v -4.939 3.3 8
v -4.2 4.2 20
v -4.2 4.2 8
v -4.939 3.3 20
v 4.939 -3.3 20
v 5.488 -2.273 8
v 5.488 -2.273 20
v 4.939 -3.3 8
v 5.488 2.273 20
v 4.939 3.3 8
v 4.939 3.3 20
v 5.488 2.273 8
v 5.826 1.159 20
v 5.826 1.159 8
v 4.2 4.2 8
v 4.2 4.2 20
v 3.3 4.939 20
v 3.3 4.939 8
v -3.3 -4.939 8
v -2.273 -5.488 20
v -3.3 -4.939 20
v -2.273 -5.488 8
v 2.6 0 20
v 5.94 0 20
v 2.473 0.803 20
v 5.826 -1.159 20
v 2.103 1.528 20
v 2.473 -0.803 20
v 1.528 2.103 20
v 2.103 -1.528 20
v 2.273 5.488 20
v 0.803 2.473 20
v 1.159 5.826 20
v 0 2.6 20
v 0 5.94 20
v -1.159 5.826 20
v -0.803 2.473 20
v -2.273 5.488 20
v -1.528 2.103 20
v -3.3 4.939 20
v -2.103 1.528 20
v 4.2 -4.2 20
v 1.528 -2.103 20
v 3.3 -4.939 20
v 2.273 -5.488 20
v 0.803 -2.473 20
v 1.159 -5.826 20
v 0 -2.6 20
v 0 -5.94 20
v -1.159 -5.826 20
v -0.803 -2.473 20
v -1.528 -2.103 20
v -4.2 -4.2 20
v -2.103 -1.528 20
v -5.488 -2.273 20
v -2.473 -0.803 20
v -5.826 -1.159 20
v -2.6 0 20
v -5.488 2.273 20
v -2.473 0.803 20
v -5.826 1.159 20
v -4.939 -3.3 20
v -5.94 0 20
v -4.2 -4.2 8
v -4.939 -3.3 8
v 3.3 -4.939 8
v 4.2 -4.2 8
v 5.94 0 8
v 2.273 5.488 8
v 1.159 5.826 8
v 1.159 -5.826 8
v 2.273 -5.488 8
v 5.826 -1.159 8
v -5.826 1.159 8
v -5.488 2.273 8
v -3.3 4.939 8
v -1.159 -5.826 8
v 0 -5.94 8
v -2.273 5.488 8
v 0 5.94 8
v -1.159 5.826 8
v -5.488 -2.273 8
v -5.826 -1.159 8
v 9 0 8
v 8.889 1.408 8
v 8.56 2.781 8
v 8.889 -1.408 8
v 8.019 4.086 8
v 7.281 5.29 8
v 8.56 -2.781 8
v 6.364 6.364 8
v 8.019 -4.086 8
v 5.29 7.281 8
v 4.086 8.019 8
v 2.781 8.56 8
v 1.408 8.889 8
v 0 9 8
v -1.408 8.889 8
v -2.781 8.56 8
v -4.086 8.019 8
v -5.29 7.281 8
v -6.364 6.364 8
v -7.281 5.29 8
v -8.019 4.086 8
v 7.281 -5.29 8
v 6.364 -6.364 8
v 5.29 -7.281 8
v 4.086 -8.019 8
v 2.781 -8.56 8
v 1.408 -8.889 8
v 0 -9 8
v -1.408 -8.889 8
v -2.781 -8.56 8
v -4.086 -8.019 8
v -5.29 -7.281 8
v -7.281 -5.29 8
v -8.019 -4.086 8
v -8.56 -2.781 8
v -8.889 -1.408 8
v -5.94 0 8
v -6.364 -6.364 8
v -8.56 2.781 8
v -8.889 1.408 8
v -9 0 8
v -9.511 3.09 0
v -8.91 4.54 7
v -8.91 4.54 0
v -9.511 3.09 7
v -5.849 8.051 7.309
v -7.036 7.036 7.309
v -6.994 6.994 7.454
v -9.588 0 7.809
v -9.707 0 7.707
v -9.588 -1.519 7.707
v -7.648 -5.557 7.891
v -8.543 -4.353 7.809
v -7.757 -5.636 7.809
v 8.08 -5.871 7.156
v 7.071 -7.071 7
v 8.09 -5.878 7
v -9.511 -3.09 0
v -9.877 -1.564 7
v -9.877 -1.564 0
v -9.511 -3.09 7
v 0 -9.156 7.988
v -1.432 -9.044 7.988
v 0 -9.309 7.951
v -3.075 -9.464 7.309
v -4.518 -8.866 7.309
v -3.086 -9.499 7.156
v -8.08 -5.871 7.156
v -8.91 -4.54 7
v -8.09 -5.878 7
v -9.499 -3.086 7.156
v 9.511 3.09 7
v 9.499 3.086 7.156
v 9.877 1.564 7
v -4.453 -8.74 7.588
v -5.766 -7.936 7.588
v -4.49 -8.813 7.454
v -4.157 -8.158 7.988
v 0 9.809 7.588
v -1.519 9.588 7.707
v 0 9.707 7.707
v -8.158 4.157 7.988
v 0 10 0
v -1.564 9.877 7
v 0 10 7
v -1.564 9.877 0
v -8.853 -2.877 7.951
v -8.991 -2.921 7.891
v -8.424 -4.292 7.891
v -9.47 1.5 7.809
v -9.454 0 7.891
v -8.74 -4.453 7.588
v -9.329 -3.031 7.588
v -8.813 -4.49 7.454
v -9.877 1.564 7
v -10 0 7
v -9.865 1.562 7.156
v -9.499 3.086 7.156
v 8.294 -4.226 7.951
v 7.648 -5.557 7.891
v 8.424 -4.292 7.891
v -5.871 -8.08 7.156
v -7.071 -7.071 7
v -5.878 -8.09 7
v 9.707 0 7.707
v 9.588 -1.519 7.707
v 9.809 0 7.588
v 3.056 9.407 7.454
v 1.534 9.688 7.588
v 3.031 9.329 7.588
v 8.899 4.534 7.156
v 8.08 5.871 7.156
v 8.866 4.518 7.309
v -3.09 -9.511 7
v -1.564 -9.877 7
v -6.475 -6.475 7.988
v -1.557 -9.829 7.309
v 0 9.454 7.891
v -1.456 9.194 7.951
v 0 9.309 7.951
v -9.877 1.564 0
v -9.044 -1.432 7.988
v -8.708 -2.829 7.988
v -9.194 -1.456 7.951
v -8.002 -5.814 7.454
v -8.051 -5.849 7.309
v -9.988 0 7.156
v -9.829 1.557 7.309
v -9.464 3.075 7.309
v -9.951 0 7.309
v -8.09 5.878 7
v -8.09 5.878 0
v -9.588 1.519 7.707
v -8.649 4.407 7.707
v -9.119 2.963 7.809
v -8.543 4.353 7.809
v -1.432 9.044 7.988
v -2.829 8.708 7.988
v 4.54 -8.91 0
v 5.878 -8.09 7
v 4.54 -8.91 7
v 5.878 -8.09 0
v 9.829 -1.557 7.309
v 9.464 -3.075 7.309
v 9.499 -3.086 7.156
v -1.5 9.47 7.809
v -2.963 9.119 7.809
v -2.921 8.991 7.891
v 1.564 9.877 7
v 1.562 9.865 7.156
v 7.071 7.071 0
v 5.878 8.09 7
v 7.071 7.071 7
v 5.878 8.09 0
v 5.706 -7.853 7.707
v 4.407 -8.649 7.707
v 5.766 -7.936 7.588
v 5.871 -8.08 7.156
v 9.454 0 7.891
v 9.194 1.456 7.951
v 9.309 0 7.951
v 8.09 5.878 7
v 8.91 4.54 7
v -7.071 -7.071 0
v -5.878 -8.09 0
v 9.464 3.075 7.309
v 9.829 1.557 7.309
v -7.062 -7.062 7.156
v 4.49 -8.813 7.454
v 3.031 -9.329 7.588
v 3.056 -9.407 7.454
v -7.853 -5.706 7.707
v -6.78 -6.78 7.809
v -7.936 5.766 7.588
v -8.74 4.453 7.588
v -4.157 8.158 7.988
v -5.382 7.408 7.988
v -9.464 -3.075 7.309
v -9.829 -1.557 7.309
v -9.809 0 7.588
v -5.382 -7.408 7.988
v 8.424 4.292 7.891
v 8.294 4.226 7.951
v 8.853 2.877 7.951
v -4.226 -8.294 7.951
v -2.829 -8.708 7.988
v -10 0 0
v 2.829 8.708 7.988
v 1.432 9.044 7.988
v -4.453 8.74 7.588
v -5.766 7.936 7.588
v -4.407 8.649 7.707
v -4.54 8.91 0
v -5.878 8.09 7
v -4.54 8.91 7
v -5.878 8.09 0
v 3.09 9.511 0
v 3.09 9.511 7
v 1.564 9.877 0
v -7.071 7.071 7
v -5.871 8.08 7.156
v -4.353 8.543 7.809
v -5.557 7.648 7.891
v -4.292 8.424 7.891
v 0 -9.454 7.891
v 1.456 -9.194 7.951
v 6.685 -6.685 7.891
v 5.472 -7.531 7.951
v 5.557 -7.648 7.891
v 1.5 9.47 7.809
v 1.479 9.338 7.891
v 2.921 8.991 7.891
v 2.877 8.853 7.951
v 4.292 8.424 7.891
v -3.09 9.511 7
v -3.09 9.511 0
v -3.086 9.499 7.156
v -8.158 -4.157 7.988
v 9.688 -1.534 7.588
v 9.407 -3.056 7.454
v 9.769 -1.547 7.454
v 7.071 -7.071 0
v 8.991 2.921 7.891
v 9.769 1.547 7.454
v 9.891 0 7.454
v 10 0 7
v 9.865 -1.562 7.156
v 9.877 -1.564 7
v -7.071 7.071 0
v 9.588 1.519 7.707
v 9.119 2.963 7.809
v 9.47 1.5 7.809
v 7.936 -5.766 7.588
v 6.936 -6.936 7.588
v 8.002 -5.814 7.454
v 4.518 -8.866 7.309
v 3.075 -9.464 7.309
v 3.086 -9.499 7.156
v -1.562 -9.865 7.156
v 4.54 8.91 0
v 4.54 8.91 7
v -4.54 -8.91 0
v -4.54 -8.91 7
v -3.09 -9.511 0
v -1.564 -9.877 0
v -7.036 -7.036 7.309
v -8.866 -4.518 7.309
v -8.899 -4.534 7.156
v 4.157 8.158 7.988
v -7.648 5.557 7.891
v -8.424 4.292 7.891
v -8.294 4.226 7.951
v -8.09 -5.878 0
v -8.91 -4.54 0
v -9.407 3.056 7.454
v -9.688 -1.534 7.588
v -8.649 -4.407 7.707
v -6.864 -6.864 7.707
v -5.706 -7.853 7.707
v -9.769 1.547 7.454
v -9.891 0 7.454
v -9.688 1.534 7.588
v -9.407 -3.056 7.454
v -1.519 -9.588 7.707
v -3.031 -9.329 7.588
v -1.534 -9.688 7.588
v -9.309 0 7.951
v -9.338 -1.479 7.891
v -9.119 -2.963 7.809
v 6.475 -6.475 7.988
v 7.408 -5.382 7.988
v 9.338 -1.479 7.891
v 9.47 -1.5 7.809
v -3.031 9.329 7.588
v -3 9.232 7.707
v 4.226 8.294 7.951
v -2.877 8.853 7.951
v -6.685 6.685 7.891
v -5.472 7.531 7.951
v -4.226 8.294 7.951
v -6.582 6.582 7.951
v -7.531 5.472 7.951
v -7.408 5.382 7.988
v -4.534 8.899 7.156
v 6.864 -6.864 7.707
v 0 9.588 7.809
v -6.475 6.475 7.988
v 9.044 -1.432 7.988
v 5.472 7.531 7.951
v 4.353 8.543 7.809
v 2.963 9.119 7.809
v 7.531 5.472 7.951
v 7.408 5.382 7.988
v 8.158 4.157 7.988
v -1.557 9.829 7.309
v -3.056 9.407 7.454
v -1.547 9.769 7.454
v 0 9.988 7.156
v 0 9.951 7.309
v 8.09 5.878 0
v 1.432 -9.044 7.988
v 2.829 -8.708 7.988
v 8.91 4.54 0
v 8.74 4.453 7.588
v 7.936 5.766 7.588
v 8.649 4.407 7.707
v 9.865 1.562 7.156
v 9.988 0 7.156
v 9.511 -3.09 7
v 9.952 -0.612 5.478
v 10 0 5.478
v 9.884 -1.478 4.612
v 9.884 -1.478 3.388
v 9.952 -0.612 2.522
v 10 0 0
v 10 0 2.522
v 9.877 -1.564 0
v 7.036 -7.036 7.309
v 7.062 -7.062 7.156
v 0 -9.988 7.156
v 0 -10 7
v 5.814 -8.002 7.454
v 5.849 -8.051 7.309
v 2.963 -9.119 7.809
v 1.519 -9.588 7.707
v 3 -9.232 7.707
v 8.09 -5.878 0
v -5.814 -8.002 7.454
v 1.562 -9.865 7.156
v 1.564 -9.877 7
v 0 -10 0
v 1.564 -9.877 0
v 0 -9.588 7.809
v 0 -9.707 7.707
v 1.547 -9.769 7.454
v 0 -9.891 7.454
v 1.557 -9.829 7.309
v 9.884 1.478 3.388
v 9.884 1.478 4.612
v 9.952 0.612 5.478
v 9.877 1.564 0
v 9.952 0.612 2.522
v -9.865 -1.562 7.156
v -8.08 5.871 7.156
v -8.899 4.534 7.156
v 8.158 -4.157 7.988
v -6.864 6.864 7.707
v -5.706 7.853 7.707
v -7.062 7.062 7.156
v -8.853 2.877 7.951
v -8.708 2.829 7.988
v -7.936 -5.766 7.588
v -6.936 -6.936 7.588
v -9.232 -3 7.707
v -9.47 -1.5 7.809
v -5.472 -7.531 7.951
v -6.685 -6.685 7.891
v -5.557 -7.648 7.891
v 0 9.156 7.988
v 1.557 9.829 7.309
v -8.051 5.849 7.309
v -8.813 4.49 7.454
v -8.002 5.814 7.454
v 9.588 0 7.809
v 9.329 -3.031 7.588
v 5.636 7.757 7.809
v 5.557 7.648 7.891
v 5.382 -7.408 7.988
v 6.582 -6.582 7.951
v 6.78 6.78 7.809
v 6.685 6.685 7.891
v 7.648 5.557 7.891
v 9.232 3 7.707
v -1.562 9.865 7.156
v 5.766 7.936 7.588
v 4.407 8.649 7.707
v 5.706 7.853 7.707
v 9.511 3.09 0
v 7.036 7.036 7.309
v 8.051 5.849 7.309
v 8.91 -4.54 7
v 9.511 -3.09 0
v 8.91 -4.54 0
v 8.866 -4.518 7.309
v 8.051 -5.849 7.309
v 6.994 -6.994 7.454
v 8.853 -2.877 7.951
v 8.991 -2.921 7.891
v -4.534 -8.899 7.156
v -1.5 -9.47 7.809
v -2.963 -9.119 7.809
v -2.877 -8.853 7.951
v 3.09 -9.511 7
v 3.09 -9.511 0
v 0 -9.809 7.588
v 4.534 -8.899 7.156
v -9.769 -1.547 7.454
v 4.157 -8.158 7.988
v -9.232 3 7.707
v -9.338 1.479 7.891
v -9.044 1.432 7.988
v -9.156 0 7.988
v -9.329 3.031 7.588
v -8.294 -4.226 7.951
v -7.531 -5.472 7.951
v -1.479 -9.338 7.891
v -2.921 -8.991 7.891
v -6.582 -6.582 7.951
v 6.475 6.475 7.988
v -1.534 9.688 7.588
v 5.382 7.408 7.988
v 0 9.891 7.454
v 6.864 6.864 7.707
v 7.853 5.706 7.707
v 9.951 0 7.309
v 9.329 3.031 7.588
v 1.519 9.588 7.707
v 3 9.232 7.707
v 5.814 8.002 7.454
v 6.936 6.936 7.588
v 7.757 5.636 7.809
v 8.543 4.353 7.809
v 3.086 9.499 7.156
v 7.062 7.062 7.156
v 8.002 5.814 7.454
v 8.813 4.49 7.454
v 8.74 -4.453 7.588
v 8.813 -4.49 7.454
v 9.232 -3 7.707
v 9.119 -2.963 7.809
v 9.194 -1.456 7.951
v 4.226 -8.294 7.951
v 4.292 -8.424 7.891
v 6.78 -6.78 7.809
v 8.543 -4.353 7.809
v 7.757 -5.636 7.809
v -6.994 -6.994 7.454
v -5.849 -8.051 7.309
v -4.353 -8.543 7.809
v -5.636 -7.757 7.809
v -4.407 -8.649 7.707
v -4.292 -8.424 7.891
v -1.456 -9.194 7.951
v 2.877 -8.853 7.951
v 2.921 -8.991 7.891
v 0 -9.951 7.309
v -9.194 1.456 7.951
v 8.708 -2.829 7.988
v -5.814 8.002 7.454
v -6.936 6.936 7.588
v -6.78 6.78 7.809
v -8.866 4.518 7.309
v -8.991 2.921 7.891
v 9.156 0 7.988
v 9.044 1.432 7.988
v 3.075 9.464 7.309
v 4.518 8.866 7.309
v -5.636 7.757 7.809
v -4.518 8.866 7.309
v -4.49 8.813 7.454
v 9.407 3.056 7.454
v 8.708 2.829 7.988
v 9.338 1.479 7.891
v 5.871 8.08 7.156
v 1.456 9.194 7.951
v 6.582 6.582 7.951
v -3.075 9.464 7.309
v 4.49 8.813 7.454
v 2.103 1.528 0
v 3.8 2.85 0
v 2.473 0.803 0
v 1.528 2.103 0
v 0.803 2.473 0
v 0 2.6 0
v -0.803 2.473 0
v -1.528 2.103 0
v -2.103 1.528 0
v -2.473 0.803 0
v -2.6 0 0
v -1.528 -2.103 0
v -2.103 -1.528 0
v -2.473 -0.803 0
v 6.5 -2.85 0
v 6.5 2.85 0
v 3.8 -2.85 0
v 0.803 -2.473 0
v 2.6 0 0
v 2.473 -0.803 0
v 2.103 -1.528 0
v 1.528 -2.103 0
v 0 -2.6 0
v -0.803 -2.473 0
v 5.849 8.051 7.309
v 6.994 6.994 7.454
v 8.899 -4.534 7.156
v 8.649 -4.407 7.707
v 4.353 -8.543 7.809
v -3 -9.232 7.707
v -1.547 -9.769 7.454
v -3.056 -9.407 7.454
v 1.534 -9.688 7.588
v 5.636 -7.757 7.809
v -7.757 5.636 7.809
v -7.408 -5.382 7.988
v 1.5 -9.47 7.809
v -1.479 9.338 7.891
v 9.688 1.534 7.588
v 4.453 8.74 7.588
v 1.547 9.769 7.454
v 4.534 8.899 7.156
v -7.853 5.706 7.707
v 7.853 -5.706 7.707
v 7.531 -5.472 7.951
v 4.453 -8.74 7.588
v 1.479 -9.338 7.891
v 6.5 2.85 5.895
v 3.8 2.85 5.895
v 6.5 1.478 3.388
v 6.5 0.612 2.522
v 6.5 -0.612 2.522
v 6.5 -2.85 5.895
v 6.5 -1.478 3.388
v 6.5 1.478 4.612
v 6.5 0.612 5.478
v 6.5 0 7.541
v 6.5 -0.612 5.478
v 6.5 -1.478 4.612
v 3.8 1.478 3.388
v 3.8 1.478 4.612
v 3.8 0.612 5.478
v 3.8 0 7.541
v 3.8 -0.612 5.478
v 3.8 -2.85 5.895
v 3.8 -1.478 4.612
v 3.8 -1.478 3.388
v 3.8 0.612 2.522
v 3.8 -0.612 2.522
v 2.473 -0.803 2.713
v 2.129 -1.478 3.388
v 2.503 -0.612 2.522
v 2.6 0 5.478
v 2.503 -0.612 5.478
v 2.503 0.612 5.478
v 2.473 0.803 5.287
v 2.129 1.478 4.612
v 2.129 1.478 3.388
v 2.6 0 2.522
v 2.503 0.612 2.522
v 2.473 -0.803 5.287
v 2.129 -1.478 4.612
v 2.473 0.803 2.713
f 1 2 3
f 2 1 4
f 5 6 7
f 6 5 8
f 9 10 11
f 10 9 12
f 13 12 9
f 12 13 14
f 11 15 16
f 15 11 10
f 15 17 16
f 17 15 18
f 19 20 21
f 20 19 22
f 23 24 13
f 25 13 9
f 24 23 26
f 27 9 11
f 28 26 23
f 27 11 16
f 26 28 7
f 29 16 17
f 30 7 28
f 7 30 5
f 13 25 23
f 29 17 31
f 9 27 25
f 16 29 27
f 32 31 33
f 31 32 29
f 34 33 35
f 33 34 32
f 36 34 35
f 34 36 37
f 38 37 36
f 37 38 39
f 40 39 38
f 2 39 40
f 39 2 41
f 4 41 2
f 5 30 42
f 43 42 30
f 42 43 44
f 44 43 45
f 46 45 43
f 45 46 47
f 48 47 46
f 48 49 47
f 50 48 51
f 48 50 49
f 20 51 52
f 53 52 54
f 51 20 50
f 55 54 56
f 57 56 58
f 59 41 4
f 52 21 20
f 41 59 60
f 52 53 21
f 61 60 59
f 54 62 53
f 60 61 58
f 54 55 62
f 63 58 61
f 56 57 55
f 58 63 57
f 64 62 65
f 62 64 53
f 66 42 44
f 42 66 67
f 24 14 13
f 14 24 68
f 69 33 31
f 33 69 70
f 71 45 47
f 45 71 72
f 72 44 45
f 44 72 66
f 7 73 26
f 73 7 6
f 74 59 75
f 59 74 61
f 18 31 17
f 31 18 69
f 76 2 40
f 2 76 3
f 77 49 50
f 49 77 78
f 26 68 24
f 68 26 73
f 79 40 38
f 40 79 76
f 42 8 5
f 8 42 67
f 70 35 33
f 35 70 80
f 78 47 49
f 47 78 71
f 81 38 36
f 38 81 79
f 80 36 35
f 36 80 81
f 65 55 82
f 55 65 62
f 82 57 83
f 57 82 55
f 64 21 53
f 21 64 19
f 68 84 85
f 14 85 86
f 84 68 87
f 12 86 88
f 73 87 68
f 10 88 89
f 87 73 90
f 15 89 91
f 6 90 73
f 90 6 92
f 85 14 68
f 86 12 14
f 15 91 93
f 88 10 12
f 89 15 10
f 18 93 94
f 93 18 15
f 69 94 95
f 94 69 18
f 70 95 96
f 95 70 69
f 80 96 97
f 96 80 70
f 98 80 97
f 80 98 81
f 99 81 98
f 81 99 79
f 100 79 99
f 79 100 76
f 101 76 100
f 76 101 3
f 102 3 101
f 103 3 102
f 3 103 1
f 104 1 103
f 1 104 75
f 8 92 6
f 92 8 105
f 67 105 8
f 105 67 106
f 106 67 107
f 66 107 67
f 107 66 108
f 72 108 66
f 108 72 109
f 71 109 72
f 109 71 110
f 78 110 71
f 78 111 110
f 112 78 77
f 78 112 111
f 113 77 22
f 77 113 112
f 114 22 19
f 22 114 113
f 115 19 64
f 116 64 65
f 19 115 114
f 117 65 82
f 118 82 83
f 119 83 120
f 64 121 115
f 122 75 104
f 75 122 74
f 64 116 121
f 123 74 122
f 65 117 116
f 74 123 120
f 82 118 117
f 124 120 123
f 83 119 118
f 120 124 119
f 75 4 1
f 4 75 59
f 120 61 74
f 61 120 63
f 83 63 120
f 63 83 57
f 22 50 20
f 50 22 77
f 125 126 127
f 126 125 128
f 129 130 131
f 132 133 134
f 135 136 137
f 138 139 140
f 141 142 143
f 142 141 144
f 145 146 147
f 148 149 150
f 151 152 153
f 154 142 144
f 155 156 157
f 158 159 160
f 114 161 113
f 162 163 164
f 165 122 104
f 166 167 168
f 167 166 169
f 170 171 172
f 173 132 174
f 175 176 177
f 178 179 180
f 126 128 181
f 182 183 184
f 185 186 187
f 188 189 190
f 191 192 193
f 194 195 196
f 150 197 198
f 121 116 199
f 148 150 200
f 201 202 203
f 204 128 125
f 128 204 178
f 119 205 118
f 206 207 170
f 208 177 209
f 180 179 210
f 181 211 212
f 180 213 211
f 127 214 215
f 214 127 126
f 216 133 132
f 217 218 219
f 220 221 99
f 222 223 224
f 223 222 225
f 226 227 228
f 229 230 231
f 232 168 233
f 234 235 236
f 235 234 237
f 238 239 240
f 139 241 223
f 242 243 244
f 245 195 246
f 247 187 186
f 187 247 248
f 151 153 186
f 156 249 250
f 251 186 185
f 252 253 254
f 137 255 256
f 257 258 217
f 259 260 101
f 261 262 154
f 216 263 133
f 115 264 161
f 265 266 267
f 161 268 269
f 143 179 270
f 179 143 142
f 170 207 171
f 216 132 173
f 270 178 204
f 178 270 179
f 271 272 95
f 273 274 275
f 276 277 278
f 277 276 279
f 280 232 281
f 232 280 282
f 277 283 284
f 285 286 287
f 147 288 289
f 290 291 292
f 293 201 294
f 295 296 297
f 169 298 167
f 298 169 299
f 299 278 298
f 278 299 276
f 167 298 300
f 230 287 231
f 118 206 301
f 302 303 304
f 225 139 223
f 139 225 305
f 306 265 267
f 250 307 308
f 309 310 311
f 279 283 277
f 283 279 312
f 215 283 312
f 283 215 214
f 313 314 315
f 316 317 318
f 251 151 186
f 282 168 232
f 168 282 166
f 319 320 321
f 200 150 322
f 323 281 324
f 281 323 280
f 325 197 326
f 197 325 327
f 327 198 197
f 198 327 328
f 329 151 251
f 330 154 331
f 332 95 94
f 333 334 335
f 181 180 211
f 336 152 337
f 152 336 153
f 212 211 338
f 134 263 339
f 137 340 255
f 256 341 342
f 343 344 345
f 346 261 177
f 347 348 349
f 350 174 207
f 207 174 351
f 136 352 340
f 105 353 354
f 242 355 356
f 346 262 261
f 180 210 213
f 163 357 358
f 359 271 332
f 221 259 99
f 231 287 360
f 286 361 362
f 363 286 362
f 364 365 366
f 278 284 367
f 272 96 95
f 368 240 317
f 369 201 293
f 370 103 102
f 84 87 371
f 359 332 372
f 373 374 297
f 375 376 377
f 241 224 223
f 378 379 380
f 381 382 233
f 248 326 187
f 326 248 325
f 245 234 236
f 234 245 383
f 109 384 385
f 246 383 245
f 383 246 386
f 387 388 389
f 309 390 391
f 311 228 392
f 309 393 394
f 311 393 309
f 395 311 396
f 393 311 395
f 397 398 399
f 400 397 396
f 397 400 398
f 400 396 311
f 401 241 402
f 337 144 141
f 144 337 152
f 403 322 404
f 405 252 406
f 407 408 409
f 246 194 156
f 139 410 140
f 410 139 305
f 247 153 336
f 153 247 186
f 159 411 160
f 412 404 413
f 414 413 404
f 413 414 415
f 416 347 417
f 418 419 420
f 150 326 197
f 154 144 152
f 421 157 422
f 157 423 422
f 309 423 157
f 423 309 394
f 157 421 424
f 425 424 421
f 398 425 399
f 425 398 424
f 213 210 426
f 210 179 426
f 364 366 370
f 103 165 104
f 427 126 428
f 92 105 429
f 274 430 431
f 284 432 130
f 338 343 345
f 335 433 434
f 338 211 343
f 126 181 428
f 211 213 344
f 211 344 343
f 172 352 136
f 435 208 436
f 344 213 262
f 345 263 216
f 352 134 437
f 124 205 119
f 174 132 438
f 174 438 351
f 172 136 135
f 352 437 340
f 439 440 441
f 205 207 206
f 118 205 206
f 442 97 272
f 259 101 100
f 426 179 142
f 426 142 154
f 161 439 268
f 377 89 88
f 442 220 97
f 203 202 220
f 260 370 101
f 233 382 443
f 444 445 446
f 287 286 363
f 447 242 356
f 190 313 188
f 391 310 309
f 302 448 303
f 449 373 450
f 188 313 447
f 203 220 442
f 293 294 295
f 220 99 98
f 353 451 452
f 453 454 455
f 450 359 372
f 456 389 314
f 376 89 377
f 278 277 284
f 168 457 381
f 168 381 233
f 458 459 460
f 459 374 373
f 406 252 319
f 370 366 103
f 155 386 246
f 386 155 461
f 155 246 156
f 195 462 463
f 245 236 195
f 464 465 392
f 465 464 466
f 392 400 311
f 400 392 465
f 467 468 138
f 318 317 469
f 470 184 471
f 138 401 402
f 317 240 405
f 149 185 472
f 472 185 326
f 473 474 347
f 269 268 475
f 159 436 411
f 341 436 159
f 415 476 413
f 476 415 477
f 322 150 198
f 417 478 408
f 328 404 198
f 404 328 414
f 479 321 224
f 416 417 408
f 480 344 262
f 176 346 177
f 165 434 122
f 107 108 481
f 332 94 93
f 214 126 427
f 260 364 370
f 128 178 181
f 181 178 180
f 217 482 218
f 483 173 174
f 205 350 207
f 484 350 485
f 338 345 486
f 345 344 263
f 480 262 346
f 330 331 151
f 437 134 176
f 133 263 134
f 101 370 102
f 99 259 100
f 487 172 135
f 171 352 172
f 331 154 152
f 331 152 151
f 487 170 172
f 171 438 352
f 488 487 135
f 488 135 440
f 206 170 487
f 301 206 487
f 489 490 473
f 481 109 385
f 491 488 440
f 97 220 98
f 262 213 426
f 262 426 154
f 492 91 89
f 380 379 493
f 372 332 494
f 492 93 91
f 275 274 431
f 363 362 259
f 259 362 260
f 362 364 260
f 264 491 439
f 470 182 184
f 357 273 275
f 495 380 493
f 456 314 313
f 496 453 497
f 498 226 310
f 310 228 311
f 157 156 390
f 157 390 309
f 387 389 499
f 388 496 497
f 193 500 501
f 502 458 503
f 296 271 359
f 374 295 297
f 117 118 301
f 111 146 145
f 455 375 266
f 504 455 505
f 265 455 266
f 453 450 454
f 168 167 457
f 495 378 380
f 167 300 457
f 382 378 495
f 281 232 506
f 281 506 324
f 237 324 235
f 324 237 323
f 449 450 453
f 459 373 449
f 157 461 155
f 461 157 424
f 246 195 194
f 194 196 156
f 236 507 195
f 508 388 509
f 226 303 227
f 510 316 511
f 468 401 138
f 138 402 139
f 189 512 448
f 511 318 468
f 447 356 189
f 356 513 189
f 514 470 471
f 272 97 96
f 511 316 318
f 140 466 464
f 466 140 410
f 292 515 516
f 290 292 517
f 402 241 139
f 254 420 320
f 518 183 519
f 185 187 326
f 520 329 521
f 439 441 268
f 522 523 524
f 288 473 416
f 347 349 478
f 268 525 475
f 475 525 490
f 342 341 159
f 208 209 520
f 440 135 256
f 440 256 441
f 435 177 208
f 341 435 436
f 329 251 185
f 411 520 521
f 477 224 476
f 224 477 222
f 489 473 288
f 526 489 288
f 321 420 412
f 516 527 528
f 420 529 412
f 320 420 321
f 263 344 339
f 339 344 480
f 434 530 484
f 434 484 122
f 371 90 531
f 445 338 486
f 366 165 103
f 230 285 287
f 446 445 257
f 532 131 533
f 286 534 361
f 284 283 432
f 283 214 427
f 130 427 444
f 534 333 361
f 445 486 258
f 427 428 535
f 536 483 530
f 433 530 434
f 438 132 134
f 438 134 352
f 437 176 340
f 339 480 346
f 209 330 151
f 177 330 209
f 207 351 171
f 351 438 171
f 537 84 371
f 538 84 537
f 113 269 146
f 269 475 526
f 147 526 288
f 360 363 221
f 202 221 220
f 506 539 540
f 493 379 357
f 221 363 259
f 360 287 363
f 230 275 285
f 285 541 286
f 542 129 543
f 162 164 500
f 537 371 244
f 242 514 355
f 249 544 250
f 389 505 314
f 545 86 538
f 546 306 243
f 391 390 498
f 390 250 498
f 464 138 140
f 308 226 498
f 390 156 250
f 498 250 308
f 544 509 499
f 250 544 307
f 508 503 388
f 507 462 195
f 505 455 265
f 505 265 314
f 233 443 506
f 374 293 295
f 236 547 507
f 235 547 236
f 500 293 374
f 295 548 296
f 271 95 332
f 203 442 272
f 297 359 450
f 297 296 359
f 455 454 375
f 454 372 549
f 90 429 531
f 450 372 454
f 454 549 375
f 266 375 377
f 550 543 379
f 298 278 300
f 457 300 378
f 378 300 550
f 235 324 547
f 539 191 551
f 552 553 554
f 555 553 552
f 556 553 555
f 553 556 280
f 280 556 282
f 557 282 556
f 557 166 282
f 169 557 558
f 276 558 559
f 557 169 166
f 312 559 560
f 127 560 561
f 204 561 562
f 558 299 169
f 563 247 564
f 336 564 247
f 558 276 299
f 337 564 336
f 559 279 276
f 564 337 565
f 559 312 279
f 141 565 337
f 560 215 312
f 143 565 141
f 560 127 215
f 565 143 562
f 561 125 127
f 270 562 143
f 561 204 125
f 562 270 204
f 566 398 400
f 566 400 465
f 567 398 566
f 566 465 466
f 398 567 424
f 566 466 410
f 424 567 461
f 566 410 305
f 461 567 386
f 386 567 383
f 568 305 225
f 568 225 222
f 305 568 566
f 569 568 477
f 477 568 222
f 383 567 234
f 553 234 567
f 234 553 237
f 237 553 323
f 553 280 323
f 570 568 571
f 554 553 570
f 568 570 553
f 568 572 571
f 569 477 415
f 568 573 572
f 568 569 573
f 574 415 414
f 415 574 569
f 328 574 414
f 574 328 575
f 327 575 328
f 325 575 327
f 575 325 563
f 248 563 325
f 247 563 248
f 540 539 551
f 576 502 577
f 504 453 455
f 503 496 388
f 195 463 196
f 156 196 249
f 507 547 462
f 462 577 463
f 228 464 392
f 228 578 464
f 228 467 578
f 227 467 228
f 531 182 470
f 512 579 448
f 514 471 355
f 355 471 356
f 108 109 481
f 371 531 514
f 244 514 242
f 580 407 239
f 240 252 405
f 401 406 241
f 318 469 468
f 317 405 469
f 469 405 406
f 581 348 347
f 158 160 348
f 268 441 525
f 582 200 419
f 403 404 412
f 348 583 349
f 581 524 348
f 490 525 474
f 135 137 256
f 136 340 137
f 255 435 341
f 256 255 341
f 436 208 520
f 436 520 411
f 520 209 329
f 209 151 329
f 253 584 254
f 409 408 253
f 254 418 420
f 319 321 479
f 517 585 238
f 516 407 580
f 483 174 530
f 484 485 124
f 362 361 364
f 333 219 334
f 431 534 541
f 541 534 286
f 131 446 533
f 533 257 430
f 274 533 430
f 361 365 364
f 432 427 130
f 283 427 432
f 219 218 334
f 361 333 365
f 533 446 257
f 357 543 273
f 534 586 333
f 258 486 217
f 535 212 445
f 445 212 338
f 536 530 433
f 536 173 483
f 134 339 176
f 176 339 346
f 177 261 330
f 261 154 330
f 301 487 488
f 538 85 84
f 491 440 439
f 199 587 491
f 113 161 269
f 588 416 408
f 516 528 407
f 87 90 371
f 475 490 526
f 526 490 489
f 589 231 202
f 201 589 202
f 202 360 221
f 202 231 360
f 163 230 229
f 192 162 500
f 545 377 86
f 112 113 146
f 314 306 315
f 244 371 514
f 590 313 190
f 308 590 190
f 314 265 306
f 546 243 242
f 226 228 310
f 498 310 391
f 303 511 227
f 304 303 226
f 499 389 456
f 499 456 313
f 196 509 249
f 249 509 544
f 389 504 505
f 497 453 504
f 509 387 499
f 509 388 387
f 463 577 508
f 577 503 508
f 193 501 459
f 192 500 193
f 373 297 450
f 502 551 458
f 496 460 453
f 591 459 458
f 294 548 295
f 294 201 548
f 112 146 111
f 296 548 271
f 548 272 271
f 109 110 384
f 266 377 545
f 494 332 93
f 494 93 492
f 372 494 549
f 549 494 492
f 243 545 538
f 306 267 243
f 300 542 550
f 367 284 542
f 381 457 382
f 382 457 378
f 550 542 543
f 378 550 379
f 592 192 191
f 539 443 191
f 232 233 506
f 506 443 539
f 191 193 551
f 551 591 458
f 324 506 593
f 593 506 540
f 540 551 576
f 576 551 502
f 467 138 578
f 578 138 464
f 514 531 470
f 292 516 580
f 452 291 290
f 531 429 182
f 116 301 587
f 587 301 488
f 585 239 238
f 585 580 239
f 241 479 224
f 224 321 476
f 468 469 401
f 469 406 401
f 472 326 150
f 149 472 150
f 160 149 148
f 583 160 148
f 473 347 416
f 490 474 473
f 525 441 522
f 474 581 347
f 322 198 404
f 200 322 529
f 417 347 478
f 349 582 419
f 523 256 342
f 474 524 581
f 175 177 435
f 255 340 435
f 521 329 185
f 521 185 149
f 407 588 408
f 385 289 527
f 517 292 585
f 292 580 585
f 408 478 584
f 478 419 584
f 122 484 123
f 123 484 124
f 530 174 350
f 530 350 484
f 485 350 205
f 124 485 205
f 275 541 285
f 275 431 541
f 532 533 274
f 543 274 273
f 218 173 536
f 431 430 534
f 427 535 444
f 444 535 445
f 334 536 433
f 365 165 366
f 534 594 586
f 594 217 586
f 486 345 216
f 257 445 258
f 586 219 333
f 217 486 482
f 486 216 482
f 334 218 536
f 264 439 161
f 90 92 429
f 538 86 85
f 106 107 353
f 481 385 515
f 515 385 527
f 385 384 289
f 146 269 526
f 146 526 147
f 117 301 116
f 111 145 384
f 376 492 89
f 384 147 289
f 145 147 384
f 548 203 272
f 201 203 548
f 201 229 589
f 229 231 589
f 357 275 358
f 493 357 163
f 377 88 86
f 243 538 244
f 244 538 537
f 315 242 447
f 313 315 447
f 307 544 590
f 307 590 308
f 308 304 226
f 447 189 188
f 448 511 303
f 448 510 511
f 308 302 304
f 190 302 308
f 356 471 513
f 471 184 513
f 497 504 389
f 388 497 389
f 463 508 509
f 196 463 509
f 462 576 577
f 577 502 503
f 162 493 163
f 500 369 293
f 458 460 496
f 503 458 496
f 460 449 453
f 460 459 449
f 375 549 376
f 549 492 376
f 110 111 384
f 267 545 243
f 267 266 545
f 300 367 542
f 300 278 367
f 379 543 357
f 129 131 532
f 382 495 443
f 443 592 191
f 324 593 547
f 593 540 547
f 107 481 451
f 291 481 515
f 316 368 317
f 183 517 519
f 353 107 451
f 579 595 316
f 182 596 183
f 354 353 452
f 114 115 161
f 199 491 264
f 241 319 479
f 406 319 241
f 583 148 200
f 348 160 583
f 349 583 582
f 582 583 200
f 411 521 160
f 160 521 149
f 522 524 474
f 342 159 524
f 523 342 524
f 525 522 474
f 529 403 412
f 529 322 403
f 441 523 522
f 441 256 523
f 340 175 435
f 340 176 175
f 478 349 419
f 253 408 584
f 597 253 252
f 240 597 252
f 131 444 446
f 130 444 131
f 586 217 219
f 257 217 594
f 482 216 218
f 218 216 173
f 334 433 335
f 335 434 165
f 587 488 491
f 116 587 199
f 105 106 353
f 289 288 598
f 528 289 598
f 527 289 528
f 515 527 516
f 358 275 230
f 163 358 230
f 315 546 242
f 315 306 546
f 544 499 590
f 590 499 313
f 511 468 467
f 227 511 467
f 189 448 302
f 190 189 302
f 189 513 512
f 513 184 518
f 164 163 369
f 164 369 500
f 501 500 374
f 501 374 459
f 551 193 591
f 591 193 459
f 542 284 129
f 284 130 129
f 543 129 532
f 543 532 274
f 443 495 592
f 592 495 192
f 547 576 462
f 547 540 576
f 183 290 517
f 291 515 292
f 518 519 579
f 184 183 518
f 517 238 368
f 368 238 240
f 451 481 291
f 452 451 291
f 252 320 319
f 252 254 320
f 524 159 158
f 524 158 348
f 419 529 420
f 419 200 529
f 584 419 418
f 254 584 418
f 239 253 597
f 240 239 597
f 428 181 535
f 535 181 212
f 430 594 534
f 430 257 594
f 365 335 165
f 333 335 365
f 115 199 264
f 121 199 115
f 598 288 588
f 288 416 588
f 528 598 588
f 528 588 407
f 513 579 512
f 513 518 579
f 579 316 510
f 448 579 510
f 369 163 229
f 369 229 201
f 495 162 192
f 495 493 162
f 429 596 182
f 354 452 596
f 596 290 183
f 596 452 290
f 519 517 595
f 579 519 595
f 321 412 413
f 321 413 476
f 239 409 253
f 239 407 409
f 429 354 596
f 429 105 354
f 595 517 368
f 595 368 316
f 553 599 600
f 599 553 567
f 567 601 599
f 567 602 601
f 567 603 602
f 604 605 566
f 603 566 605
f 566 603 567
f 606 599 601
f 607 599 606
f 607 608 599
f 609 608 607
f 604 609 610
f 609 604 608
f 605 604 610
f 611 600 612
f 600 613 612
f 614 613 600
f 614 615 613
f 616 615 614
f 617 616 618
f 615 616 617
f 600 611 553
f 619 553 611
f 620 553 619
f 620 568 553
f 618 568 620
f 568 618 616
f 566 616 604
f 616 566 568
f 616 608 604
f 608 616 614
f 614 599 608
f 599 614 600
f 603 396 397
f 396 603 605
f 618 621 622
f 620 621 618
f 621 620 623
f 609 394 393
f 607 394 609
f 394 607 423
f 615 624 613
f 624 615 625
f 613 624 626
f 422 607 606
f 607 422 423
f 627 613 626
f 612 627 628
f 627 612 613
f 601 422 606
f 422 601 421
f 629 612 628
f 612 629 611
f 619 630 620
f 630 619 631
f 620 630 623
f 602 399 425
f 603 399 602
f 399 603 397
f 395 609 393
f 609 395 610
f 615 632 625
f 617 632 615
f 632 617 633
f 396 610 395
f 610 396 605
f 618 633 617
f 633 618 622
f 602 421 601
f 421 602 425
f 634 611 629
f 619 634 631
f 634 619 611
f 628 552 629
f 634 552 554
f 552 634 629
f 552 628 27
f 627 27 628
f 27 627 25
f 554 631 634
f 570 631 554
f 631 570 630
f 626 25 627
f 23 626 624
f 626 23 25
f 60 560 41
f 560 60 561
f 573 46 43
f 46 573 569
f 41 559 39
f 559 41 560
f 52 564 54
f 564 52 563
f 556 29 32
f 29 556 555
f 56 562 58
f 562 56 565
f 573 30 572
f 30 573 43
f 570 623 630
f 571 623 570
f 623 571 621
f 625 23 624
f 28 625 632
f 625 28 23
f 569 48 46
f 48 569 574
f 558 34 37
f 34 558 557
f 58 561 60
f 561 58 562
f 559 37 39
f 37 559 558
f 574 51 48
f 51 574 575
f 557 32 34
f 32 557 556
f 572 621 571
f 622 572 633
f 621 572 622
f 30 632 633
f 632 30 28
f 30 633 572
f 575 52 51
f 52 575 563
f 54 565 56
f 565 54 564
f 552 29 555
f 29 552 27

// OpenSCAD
// Parametric Pulley with multiple belt profiles
// by droftarts January 2012

// Based on pulleys by:
// http://www.thingiverse.com/thing:11256 by me!
// https://github.com/prusajr/PrusaMendel by Josef Prusa
// http://www.thingiverse.com/thing:3104 by GilesBathgate
// http://www.thingiverse.com/thing:2079 by nophead

// dxf tooth data from http://oem.cadregister.com/asp/PPOW_Entry.asp?company=915217&elementID=07807803/METRIC/URETH/WV0025/F
// pulley diameter checked and modelled from data at http://www.sdp-si.com/D265/HTML/D265T016.html

/**
 * @name Pulley
 * @category Printed
 * @using 1 x m3 nut, normal or nyloc
 * @using 1 x m3x10 set screw or 1 x m3x8 grub screw
 */


// tuneable constants

teeth = 8;			// Number of teeth, standard Mendel T5 belt = 8, gives Outside Diameter of 11.88mm
profile = 6;		// 1=MXL 2=40DP 3=XL 4=H 5=T2.5 6=T5 7=T10 8=AT5 9=HTD_3mm 10=HTD_5mm 11=HTD_8mm 12=GT2_2mm 13=GT2_3mm 14=GT2_5mm

motor_shaft = 5.2;	// NEMA17 motor shaft exact diameter = 5
m3_dia = 3.2;		// 3mm hole diameter
m3_nut_hex = 1;		// 1 for hex, 0 for square nut
m3_nut_flats = 5.7;	// normal M3 hex nut exact width = 5.5
m3_nut_depth = 2.7;	// normal M3 hex nut exact depth = 2.4, nyloc = 4

retainer = 0;		// Belt retainer above teeth, 0 = No, 1 = Yes
retainer_ht = 1.5;	// height of retainer flange over pulley, standard = 1.5
idler = 0;			// Belt retainer below teeth, 0 = No, 1 = Yes
idler_ht = 1.5;		// height of idler flange over pulley, standard = 1.5

pulley_t_ht = 12;	// length of toothed part of pulley, standard = 12
pulley_b_ht = 8;		// pulley base height, standard = 8. Set to same as idler_ht if you want an idler but no pulley.
pulley_b_dia = 20;	// pulley base diameter, standard = 20
no_of_nuts = 1;		// number of captive nuts required, standard = 1
nut_angle = 90;		// angle between nuts, standard = 90
nut_shaft_distance = 1.2;	// distance between inner face of nut and shaft, can be negative.


//	********************************
//	** Scaling tooth for good fit **
//	********************************
/*	To improve fit of belt to pulley, set the following constant. Decrease or increase by 0.1mm at a time. We are modelling the *BELT* tooth here, not the tooth on the pulley. Increasing the number will *decrease* the pulley tooth size. Increasing the tooth width will also scale proportionately the tooth depth, to maintain the shape of the tooth, and increase how far into the pulley the tooth is indented. Can be negative */

additional_tooth_width = 0.2; //mm

//	If you need more tooth depth than this provides, adjust the following constant. However, this will cause the shape of the tooth to change.

additional_tooth_depth = 0; //mm

// calculated constants

nut_elevation = pulley_b_ht/2;
m3_nut_points = 2*((m3_nut_flats/2)/cos(30)); // This is needed for the nut trap

// The following set the pulley diameter for a given number of teeth

MXL_pulley_dia = tooth_spacing (2.032,0.254);
40DP_pulley_dia = tooth_spacing (2.07264,0.1778);
XL_pulley_dia = tooth_spacing (5.08,0.254);
H_pulley_dia = tooth_spacing (9.525,0.381);
T2_5_pulley_dia = tooth_spaceing_curvefit (0.7467,0.796,1.026);
T5_pulley_dia = tooth_spaceing_curvefit (0.6523,1.591,1.064);
T10_pulley_dia = tooth_spacing (10,0.93);
AT5_pulley_dia = tooth_spaceing_curvefit (0.6523,1.591,1.064);
HTD_3mm_pulley_dia = tooth_spacing (3,0.381);
HTD_5mm_pulley_dia = tooth_spacing (5,0.5715);
HTD_8mm_pulley_dia = tooth_spacing (8,0.6858);
GT2_2mm_pulley_dia = tooth_spacing (2,0.254);
GT2_3mm_pulley_dia = tooth_spacing (3,0.381);
GT2_5mm_pulley_dia = tooth_spacing (5,0.5715);

// The following calls the pulley creation part, and passes the pulley diameter and tooth width to that module

if ( profile == 1 ) { pulley ( "MXL" , MXL_pulley_dia , 0.508 , 1.321 ); }
if ( profile == 2 ) { pulley ( "40 D.P." , 40DP_pulley_dia , 0.457 , 1.226 ); }
if ( profile == 3 ) { pulley ( "XL" , XL_pulley_dia , 1.27, 3.051 ); }
if ( profile == 4 ) { pulley ( "H" , H_pulley_dia ,1.905 , 5.359 ); }
if ( profile == 5 ) { pulley ( "T2.5" , T2_5_pulley_dia , 0.7 , 1.678 ); }
if ( profile == 6 ) { pulley ( "T5" , T5_pulley_dia , 1.19 , 3.264 ); }
if ( profile == 7 ) { pulley ( "T10" , T10_pulley_dia , 2.5 , 6.13 ); }
if ( profile == 8 ) { pulley ( "AT5" , AT5_pulley_dia , 1.19 , 4.268 ); }
if ( profile == 9 ) { pulley ( "HTD 3mm" , HTD_3mm_pulley_dia , 1.289 , 2.27 ); }
if ( profile == 10 ) { pulley ( "HTD 5mm" , HTD_5mm_pulley_dia , 2.199 , 3.781 ); }
if ( profile == 11 ) { pulley ( "HTD 8mm" , HTD_8mm_pulley_dia , 3.607 , 6.603 ); }
if ( profile == 12 ) { pulley ( "GT2 2mm" , GT2_2mm_pulley_dia , 0.764 , 1.494 ); }
if ( profile == 13 ) { pulley ( "GT2 3mm" , GT2_3mm_pulley_dia , 1.169 , 2.31 ); }
if ( profile == 14 ) { pulley ( "GT2 5mm" , GT2_5mm_pulley_dia , 1.969 , 3.952 ); }

// Functions

function tooth_spaceing_curvefit (b,c,d)
	= ((c * pow(teeth,d)) / (b + pow(teeth,d))) * teeth ;

function tooth_spacing(tooth_pitch,pitch_line_offset)
	= (2*((teeth*tooth_pitch)/(3.14159265*2)-pitch_line_offset)) ;

// Main Module

module pulley( belt_type , pulley_OD , tooth_depth , tooth_width )
	{
	echo (str("Belt type = ",belt_type,"; Number of teeth = ",teeth,"; Pulley Outside Diameter = ",pulley_OD,"mm "));
	tooth_distance_from_centre = sqrt( pow(pulley_OD/2,2) - pow((tooth_width+additional_tooth_width)/2,2));
	tooth_width_scale = (tooth_width + additional_tooth_width ) / tooth_width;
	tooth_depth_scale = ((tooth_depth + additional_tooth_depth ) / tooth_depth) ;


//	************************************************************************
//	*** uncomment the following line if pulley is wider than puller base ***
//	************************************************************************

//	translate ([0,0, pulley_b_ht + pulley_t_ht + retainer_ht ]) rotate ([0,180,0])

	difference()
	 {	 
		union()
		{
			//base
	
			if ( pulley_b_ht < 2 ) { echo ("CAN'T DRAW PULLEY BASE, HEIGHT LESS THAN 2!!!"); } else {
				rotate_extrude($fn=pulley_b_dia*2)
				{
						square([pulley_b_dia/2-1,pulley_b_ht]);
						square([pulley_b_dia/2,pulley_b_ht-1]);
						translate([pulley_b_dia/2-1,pulley_b_ht-1]) circle(1);
				}
			}
	
		difference()
			{
			//shaft - diameter is outside diameter of pulley
			
			translate([0,0,pulley_b_ht]) 
			rotate ([0,0,360/(teeth*4)]) 
			cylinder(r=pulley_OD/2,h=pulley_t_ht, $fn=teeth*4);
	
			//teeth - cut out of shaft
		
			for(i=[1:teeth]) 
			rotate([0,0,i*(360/teeth)])
			translate([0,-tooth_distance_from_centre,pulley_b_ht -1]) 
			scale ([ tooth_width_scale , tooth_depth_scale , 0 ]) 
			{
			if ( profile == 1 ) { MXL();}
			if ( profile == 2 ) { 40DP();}
			if ( profile == 3 ) { XL();}
			if ( profile == 4 ) { H();}
			if ( profile == 5 ) { T2_5();}
			if ( profile == 6 ) { T5();}
			if ( profile == 7 ) { T10();}
			if ( profile == 8 ) { AT5();}
			if ( profile == 9 ) { HTD_3mm();}
			if ( profile == 10 ) { HTD_5mm();}
			if ( profile == 11 ) { HTD_8mm();}
			if ( profile == 12 ) { GT2_2mm();}
			if ( profile == 13 ) { GT2_3mm();}
			if ( profile == 14 ) { GT2_5mm();}
			}

			}
			
		//belt retainer / idler
		if ( retainer > 0 ) {translate ([0,0, pulley_b_ht + pulley_t_ht ]) 
		rotate_extrude($fn=teeth*4)  
		polygon([[0,0],[pulley_OD/2,0],[pulley_OD/2 + retainer_ht , retainer_ht],[0 , retainer_ht],[0,0]]);}
		
		if ( idler > 0 ) {translate ([0,0, pulley_b_ht - idler_ht ]) 
		rotate_extrude($fn=teeth*4)  
		polygon([[0,0],[pulley_OD/2 + idler_ht,0],[pulley_OD/2 , idler_ht],[0 , idler_ht],[0,0]]);}
	
		}
	   
		//hole for motor shaft
		translate([0,0,-1])cylinder(r=motor_shaft/2,h=pulley_b_ht + pulley_t_ht + retainer_ht + 2,$fn=motor_shaft*4);
				
		//captive nut and grub screw holes
	
		if ( pulley_b_ht < m3_nut_flats ) { echo ("CAN'T DRAW CAPTIVE NUTS, HEIGHT LESS THAN NUT DIAMETER!!!"); } else {
		if ( (pulley_b_dia - motor_shaft)/2 < m3_nut_depth + 3 ) { echo ("CAN'T DRAW CAPTIVE NUTS, DIAMETER TOO SMALL FOR NUT DEPTH!!!"); } else {
	
			for(j=[1:no_of_nuts]) rotate([0,0,j*nut_angle])
			translate([0,0,nut_elevation])rotate([90,0,0])
	
			union()
			{
				//entrance
				translate([0,-pulley_b_ht/4-0.5,motor_shaft/2+m3_nut_depth/2+nut_shaft_distance]) cube([m3_nut_flats,pulley_b_ht/2+1,m3_nut_depth],center=true);
	
				//nut
				if ( m3_nut_hex > 0 )
					{
						// hex nut
						translate([0,0.25,motor_shaft/2+m3_nut_depth/2+nut_shaft_distance]) rotate([0,0,30]) cylinder(r=m3_nut_points/2,h=m3_nut_depth,center=true,$fn=6);
					} else {
						// square nut
						translate([0,0.25,motor_shaft/2+m3_nut_depth/2+nut_shaft_distance]) cube([m3_nut_flats,m3_nut_flats,m3_nut_depth],center=true);
					}
	
				//grub screw hole
				rotate([0,0,22.5])cylinder(r=m3_dia/2,h=pulley_b_dia/2+1,$fn=8);
			}
		}}
	 }
	   
	}


// Tooth profile modules

module MXL()
	{
	linear_extrude(height=pulley_t_ht+2) polygon([[-0.660421,-0.5],[-0.660421,0],[-0.621898,0.006033],[-0.587714,0.023037],[-0.560056,0.049424],[-0.541182,0.083609],[-0.417357,0.424392],[-0.398413,0.458752],[-0.370649,0.48514],[-0.336324,0.502074],[-0.297744,0.508035],[0.297744,0.508035],[0.336268,0.502074],[0.370452,0.48514],[0.39811,0.458752],[0.416983,0.424392],[0.540808,0.083609],[0.559752,0.049424],[0.587516,0.023037],[0.621841,0.006033],[0.660421,0],[0.660421,-0.5]]);
	}

module 40DP()
	{
	linear_extrude(height=pulley_t_ht+2) polygon([[-0.612775,-0.5],[-0.612775,0],[-0.574719,0.010187],[-0.546453,0.0381],[-0.355953,0.3683],[-0.327604,0.405408],[-0.291086,0.433388],[-0.248548,0.451049],[-0.202142,0.4572],[0.202494,0.4572],[0.248653,0.451049],[0.291042,0.433388],[0.327609,0.405408],[0.356306,0.3683],[0.546806,0.0381],[0.574499,0.010187],[0.612775,0],[0.612775,-0.5]]);
	}

module XL()
	{
	linear_extrude(height=pulley_t_ht+2) polygon([[-1.525411,-1],[-1.525411,0],[-1.41777,0.015495],[-1.320712,0.059664],[-1.239661,0.129034],[-1.180042,0.220133],[-0.793044,1.050219],[-0.733574,1.141021],[-0.652507,1.210425],[-0.555366,1.254759],[-0.447675,1.270353],[0.447675,1.270353],[0.555366,1.254759],[0.652507,1.210425],[0.733574,1.141021],[0.793044,1.050219],[1.180042,0.220133],[1.239711,0.129034],[1.320844,0.059664],[1.417919,0.015495],[1.525411,0],[1.525411,-1]]);
	}

module H()
	{
	linear_extrude(height=pulley_t_ht+2) polygon([[-2.6797,-1],[-2.6797,0],[-2.600907,0.006138],[-2.525342,0.024024],[-2.45412,0.052881],[-2.388351,0.091909],[-2.329145,0.140328],[-2.277614,0.197358],[-2.234875,0.262205],[-2.202032,0.334091],[-1.75224,1.57093],[-1.719538,1.642815],[-1.676883,1.707663],[-1.62542,1.764693],[-1.566256,1.813112],[-1.500512,1.85214],[-1.4293,1.880997],[-1.353742,1.898883],[-1.274949,1.905021],[1.275281,1.905021],[1.354056,1.898883],[1.429576,1.880997],[1.500731,1.85214],[1.566411,1.813112],[1.625508,1.764693],[1.676919,1.707663],[1.719531,1.642815],[1.752233,1.57093],[2.20273,0.334091],[2.235433,0.262205],[2.278045,0.197358],[2.329455,0.140328],[2.388553,0.091909],[2.454233,0.052881],[2.525384,0.024024],[2.600904,0.006138],[2.6797,0],[2.6797,-1]]);
	}

module T2_5()
	{
	linear_extrude(height=pulley_t_ht+2) polygon([[-0.839258,-0.5],[-0.839258,0],[-0.770246,0.021652],[-0.726369,0.079022],[-0.529167,0.620889],[-0.485025,0.67826],[-0.416278,0.699911],[0.416278,0.699911],[0.484849,0.67826],[0.528814,0.620889],[0.726369,0.079022],[0.770114,0.021652],[0.839258,0],[0.839258,-0.5]]);
	}

module T5()
	{
	linear_extrude(height=pulley_t_ht+2) polygon([[-1.632126,-0.5],[-1.632126,0],[-1.568549,0.004939],[-1.507539,0.019367],[-1.450023,0.042686],[-1.396912,0.074224],[-1.349125,0.113379],[-1.307581,0.159508],[-1.273186,0.211991],[-1.246868,0.270192],[-1.009802,0.920362],[-0.983414,0.978433],[-0.949018,1.030788],[-0.907524,1.076798],[-0.859829,1.115847],[-0.80682,1.147314],[-0.749402,1.170562],[-0.688471,1.184956],[-0.624921,1.189895],[0.624971,1.189895],[0.688622,1.184956],[0.749607,1.170562],[0.807043,1.147314],[0.860055,1.115847],[0.907754,1.076798],[0.949269,1.030788],[0.9837,0.978433],[1.010193,0.920362],[1.246907,0.270192],[1.273295,0.211991],[1.307726,0.159508],[1.349276,0.113379],[1.397039,0.074224],[1.450111,0.042686],[1.507589,0.019367],[1.568563,0.004939],[1.632126,0],[1.632126,-0.5]]);
	}

module T10()
	{
	linear_extrude(height=pulley_t_ht+2) polygon([[-3.06511,-1],[-3.06511,0],[-2.971998,0.007239],[-2.882718,0.028344],[-2.79859,0.062396],[-2.720931,0.108479],[-2.651061,0.165675],[-2.590298,0.233065],[-2.539962,0.309732],[-2.501371,0.394759],[-1.879071,2.105025],[-1.840363,2.190052],[-1.789939,2.266719],[-1.729114,2.334109],[-1.659202,2.391304],[-1.581518,2.437387],[-1.497376,2.47144],[-1.408092,2.492545],[-1.314979,2.499784],[1.314979,2.499784],[1.408091,2.492545],[1.497371,2.47144],[1.581499,2.437387],[1.659158,2.391304],[1.729028,2.334109],[1.789791,2.266719],[1.840127,2.190052],[1.878718,2.105025],[2.501018,0.394759],[2.539726,0.309732],[2.59015,0.233065],[2.650975,0.165675],[2.720887,0.108479],[2.798571,0.062396],[2.882713,0.028344],[2.971997,0.007239],[3.06511,0],[3.06511,-1]]);
	}

module AT5()
	{
	linear_extrude(height=pulley_t_ht+2) polygon([[-2.134129,-0.75],[-2.134129,0],[-2.058023,0.005488],[-1.984595,0.021547],[-1.914806,0.047569],[-1.849614,0.082947],[-1.789978,0.127073],[-1.736857,0.179338],[-1.691211,0.239136],[-1.653999,0.305859],[-1.349199,0.959203],[-1.286933,1.054635],[-1.201914,1.127346],[-1.099961,1.173664],[-0.986896,1.18992],[0.986543,1.18992],[1.099614,1.173664],[1.201605,1.127346],[1.286729,1.054635],[1.349199,0.959203],[1.653646,0.305859],[1.690859,0.239136],[1.73651,0.179338],[1.789644,0.127073],[1.849305,0.082947],[1.914539,0.047569],[1.984392,0.021547],[2.057906,0.005488],[2.134129,0],[2.134129,-0.75]]);
	}

module HTD_3mm()
	{
	linear_extrude(height=pulley_t_ht+2) polygon([[-1.135062,-0.5],[-1.135062,0],[-1.048323,0.015484],[-0.974284,0.058517],[-0.919162,0.123974],[-0.889176,0.206728],[-0.81721,0.579614],[-0.800806,0.653232],[-0.778384,0.72416],[-0.750244,0.792137],[-0.716685,0.856903],[-0.678005,0.918199],[-0.634505,0.975764],[-0.586483,1.029338],[-0.534238,1.078662],[-0.47807,1.123476],[-0.418278,1.16352],[-0.355162,1.198533],[-0.289019,1.228257],[-0.22015,1.25243],[-0.148854,1.270793],[-0.07543,1.283087],[-0.000176,1.28905],[0.075081,1.283145],[0.148515,1.270895],[0.219827,1.252561],[0.288716,1.228406],[0.354879,1.19869],[0.418018,1.163675],[0.477831,1.123623],[0.534017,1.078795],[0.586276,1.029452],[0.634307,0.975857],[0.677809,0.91827],[0.716481,0.856953],[0.750022,0.792167],[0.778133,0.724174],[0.800511,0.653236],[0.816857,0.579614],[0.888471,0.206728],[0.919014,0.123974],[0.974328,0.058517],[1.048362,0.015484],[1.135062,0],[1.135062,-0.5]]);
	}

module HTD_5mm()
	{
	linear_extrude(height=pulley_t_ht+2) polygon([[-1.89036,-0.75],[-1.89036,0],[-1.741168,0.02669],[-1.61387,0.100806],[-1.518984,0.21342],[-1.467026,0.3556],[-1.427162,0.960967],[-1.398568,1.089602],[-1.359437,1.213531],[-1.310296,1.332296],[-1.251672,1.445441],[-1.184092,1.552509],[-1.108081,1.653042],[-1.024167,1.746585],[-0.932877,1.832681],[-0.834736,1.910872],[-0.730271,1.980701],[-0.62001,2.041713],[-0.504478,2.09345],[-0.384202,2.135455],[-0.259708,2.167271],[-0.131524,2.188443],[-0.000176,2.198511],[0.131296,2.188504],[0.259588,2.167387],[0.384174,2.135616],[0.504527,2.093648],[0.620123,2.04194],[0.730433,1.980949],[0.834934,1.911132],[0.933097,1.832945],[1.024398,1.746846],[1.108311,1.653291],[1.184308,1.552736],[1.251865,1.445639],[1.310455,1.332457],[1.359552,1.213647],[1.39863,1.089664],[1.427162,0.960967],[1.467026,0.3556],[1.518984,0.21342],[1.61387,0.100806],[1.741168,0.02669],[1.89036,0],[1.89036,-0.75]]);
	}

module HTD_8mm()
	{
	linear_extrude(height=pulley_t_ht+2) polygon([[-3.301471,-1],[-3.301471,0],[-3.16611,0.012093],[-3.038062,0.047068],[-2.919646,0.10297],[-2.813182,0.177844],[-2.720989,0.269734],[-2.645387,0.376684],[-2.588694,0.496739],[-2.553229,0.627944],[-2.460801,1.470025],[-2.411413,1.691917],[-2.343887,1.905691],[-2.259126,2.110563],[-2.158035,2.30575],[-2.041518,2.490467],[-1.910478,2.66393],[-1.76582,2.825356],[-1.608446,2.973961],[-1.439261,3.10896],[-1.259169,3.22957],[-1.069074,3.335006],[-0.869878,3.424485],[-0.662487,3.497224],[-0.447804,3.552437],[-0.226732,3.589341],[-0.000176,3.607153],[0.226511,3.589461],[0.447712,3.552654],[0.66252,3.497516],[0.870027,3.424833],[1.069329,3.33539],[1.259517,3.229973],[1.439687,3.109367],[1.608931,2.974358],[1.766344,2.825731],[1.911018,2.664271],[2.042047,2.490765],[2.158526,2.305998],[2.259547,2.110755],[2.344204,1.905821],[2.411591,1.691983],[2.460801,1.470025],[2.553229,0.627944],[2.588592,0.496739],[2.645238,0.376684],[2.720834,0.269734],[2.81305,0.177844],[2.919553,0.10297],[3.038012,0.047068],[3.166095,0.012093],[3.301471,0],[3.301471,-1]]);
	}

module GT2_2mm()
	{
	linear_extrude(height=pulley_t_ht+2) polygon([[0.747183,-0.5],[0.747183,0],[0.647876,0.037218],[0.598311,0.130528],[0.578556,0.238423],[0.547158,0.343077],[0.504649,0.443762],[0.451556,0.53975],[0.358229,0.636924],[0.2484,0.707276],[0.127259,0.750044],[0,0.76447],[-0.127259,0.750044],[-0.2484,0.707276],[-0.358229,0.636924],[-0.451556,0.53975],[-0.504797,0.443762],[-0.547291,0.343077],[-0.578605,0.238423],[-0.598311,0.130528],[-0.648009,0.037218],[-0.747183,0],[-0.747183,-0.5]]);
	}

module GT2_3mm()
	{
	linear_extrude(height=pulley_t_ht+2) polygon([[-1.155171,-0.5],[-1.155171,0],[-1.065317,0.016448],[-0.989057,0.062001],[-0.93297,0.130969],[-0.90364,0.217664],[-0.863705,0.408181],[-0.800056,0.591388],[-0.713587,0.765004],[-0.60519,0.926747],[-0.469751,1.032548],[-0.320719,1.108119],[-0.162625,1.153462],[0,1.168577],[0.162625,1.153462],[0.320719,1.108119],[0.469751,1.032548],[0.60519,0.926747],[0.713587,0.765004],[0.800056,0.591388],[0.863705,0.408181],[0.90364,0.217664],[0.932921,0.130969],[0.988924,0.062001],[1.065168,0.016448],[1.155171,0],[1.155171,-0.5]]);
	}

module GT2_5mm()
	{
	linear_extrude(height=pulley_t_ht+2) polygon([[-1.975908,-0.75],[-1.975908,0],[-1.797959,0.03212],[-1.646634,0.121224],[-1.534534,0.256431],[-1.474258,0.426861],[-1.446911,0.570808],[-1.411774,0.712722],[-1.368964,0.852287],[-1.318597,0.989189],[-1.260788,1.123115],[-1.195654,1.25375],[-1.12331,1.380781],[-1.043869,1.503892],[-0.935264,1.612278],[-0.817959,1.706414],[-0.693181,1.786237],[-0.562151,1.851687],[-0.426095,1.9027],[-0.286235,1.939214],[-0.143795,1.961168],[0,1.9685],[0.143796,1.961168],[0.286235,1.939214],[0.426095,1.9027],[0.562151,1.851687],[0.693181,1.786237],[0.817959,1.706414],[0.935263,1.612278],[1.043869,1.503892],[1.123207,1.380781],[1.195509,1.25375],[1.26065,1.123115],[1.318507,0.989189],[1.368956,0.852287],[1.411872,0.712722],[1.447132,0.570808],[1.474611,0.426861],[1.534583,0.256431],[1.646678,0.121223],[1.798064,0.03212],[1.975908,0],[1.975908,-0.75]]);
	}
